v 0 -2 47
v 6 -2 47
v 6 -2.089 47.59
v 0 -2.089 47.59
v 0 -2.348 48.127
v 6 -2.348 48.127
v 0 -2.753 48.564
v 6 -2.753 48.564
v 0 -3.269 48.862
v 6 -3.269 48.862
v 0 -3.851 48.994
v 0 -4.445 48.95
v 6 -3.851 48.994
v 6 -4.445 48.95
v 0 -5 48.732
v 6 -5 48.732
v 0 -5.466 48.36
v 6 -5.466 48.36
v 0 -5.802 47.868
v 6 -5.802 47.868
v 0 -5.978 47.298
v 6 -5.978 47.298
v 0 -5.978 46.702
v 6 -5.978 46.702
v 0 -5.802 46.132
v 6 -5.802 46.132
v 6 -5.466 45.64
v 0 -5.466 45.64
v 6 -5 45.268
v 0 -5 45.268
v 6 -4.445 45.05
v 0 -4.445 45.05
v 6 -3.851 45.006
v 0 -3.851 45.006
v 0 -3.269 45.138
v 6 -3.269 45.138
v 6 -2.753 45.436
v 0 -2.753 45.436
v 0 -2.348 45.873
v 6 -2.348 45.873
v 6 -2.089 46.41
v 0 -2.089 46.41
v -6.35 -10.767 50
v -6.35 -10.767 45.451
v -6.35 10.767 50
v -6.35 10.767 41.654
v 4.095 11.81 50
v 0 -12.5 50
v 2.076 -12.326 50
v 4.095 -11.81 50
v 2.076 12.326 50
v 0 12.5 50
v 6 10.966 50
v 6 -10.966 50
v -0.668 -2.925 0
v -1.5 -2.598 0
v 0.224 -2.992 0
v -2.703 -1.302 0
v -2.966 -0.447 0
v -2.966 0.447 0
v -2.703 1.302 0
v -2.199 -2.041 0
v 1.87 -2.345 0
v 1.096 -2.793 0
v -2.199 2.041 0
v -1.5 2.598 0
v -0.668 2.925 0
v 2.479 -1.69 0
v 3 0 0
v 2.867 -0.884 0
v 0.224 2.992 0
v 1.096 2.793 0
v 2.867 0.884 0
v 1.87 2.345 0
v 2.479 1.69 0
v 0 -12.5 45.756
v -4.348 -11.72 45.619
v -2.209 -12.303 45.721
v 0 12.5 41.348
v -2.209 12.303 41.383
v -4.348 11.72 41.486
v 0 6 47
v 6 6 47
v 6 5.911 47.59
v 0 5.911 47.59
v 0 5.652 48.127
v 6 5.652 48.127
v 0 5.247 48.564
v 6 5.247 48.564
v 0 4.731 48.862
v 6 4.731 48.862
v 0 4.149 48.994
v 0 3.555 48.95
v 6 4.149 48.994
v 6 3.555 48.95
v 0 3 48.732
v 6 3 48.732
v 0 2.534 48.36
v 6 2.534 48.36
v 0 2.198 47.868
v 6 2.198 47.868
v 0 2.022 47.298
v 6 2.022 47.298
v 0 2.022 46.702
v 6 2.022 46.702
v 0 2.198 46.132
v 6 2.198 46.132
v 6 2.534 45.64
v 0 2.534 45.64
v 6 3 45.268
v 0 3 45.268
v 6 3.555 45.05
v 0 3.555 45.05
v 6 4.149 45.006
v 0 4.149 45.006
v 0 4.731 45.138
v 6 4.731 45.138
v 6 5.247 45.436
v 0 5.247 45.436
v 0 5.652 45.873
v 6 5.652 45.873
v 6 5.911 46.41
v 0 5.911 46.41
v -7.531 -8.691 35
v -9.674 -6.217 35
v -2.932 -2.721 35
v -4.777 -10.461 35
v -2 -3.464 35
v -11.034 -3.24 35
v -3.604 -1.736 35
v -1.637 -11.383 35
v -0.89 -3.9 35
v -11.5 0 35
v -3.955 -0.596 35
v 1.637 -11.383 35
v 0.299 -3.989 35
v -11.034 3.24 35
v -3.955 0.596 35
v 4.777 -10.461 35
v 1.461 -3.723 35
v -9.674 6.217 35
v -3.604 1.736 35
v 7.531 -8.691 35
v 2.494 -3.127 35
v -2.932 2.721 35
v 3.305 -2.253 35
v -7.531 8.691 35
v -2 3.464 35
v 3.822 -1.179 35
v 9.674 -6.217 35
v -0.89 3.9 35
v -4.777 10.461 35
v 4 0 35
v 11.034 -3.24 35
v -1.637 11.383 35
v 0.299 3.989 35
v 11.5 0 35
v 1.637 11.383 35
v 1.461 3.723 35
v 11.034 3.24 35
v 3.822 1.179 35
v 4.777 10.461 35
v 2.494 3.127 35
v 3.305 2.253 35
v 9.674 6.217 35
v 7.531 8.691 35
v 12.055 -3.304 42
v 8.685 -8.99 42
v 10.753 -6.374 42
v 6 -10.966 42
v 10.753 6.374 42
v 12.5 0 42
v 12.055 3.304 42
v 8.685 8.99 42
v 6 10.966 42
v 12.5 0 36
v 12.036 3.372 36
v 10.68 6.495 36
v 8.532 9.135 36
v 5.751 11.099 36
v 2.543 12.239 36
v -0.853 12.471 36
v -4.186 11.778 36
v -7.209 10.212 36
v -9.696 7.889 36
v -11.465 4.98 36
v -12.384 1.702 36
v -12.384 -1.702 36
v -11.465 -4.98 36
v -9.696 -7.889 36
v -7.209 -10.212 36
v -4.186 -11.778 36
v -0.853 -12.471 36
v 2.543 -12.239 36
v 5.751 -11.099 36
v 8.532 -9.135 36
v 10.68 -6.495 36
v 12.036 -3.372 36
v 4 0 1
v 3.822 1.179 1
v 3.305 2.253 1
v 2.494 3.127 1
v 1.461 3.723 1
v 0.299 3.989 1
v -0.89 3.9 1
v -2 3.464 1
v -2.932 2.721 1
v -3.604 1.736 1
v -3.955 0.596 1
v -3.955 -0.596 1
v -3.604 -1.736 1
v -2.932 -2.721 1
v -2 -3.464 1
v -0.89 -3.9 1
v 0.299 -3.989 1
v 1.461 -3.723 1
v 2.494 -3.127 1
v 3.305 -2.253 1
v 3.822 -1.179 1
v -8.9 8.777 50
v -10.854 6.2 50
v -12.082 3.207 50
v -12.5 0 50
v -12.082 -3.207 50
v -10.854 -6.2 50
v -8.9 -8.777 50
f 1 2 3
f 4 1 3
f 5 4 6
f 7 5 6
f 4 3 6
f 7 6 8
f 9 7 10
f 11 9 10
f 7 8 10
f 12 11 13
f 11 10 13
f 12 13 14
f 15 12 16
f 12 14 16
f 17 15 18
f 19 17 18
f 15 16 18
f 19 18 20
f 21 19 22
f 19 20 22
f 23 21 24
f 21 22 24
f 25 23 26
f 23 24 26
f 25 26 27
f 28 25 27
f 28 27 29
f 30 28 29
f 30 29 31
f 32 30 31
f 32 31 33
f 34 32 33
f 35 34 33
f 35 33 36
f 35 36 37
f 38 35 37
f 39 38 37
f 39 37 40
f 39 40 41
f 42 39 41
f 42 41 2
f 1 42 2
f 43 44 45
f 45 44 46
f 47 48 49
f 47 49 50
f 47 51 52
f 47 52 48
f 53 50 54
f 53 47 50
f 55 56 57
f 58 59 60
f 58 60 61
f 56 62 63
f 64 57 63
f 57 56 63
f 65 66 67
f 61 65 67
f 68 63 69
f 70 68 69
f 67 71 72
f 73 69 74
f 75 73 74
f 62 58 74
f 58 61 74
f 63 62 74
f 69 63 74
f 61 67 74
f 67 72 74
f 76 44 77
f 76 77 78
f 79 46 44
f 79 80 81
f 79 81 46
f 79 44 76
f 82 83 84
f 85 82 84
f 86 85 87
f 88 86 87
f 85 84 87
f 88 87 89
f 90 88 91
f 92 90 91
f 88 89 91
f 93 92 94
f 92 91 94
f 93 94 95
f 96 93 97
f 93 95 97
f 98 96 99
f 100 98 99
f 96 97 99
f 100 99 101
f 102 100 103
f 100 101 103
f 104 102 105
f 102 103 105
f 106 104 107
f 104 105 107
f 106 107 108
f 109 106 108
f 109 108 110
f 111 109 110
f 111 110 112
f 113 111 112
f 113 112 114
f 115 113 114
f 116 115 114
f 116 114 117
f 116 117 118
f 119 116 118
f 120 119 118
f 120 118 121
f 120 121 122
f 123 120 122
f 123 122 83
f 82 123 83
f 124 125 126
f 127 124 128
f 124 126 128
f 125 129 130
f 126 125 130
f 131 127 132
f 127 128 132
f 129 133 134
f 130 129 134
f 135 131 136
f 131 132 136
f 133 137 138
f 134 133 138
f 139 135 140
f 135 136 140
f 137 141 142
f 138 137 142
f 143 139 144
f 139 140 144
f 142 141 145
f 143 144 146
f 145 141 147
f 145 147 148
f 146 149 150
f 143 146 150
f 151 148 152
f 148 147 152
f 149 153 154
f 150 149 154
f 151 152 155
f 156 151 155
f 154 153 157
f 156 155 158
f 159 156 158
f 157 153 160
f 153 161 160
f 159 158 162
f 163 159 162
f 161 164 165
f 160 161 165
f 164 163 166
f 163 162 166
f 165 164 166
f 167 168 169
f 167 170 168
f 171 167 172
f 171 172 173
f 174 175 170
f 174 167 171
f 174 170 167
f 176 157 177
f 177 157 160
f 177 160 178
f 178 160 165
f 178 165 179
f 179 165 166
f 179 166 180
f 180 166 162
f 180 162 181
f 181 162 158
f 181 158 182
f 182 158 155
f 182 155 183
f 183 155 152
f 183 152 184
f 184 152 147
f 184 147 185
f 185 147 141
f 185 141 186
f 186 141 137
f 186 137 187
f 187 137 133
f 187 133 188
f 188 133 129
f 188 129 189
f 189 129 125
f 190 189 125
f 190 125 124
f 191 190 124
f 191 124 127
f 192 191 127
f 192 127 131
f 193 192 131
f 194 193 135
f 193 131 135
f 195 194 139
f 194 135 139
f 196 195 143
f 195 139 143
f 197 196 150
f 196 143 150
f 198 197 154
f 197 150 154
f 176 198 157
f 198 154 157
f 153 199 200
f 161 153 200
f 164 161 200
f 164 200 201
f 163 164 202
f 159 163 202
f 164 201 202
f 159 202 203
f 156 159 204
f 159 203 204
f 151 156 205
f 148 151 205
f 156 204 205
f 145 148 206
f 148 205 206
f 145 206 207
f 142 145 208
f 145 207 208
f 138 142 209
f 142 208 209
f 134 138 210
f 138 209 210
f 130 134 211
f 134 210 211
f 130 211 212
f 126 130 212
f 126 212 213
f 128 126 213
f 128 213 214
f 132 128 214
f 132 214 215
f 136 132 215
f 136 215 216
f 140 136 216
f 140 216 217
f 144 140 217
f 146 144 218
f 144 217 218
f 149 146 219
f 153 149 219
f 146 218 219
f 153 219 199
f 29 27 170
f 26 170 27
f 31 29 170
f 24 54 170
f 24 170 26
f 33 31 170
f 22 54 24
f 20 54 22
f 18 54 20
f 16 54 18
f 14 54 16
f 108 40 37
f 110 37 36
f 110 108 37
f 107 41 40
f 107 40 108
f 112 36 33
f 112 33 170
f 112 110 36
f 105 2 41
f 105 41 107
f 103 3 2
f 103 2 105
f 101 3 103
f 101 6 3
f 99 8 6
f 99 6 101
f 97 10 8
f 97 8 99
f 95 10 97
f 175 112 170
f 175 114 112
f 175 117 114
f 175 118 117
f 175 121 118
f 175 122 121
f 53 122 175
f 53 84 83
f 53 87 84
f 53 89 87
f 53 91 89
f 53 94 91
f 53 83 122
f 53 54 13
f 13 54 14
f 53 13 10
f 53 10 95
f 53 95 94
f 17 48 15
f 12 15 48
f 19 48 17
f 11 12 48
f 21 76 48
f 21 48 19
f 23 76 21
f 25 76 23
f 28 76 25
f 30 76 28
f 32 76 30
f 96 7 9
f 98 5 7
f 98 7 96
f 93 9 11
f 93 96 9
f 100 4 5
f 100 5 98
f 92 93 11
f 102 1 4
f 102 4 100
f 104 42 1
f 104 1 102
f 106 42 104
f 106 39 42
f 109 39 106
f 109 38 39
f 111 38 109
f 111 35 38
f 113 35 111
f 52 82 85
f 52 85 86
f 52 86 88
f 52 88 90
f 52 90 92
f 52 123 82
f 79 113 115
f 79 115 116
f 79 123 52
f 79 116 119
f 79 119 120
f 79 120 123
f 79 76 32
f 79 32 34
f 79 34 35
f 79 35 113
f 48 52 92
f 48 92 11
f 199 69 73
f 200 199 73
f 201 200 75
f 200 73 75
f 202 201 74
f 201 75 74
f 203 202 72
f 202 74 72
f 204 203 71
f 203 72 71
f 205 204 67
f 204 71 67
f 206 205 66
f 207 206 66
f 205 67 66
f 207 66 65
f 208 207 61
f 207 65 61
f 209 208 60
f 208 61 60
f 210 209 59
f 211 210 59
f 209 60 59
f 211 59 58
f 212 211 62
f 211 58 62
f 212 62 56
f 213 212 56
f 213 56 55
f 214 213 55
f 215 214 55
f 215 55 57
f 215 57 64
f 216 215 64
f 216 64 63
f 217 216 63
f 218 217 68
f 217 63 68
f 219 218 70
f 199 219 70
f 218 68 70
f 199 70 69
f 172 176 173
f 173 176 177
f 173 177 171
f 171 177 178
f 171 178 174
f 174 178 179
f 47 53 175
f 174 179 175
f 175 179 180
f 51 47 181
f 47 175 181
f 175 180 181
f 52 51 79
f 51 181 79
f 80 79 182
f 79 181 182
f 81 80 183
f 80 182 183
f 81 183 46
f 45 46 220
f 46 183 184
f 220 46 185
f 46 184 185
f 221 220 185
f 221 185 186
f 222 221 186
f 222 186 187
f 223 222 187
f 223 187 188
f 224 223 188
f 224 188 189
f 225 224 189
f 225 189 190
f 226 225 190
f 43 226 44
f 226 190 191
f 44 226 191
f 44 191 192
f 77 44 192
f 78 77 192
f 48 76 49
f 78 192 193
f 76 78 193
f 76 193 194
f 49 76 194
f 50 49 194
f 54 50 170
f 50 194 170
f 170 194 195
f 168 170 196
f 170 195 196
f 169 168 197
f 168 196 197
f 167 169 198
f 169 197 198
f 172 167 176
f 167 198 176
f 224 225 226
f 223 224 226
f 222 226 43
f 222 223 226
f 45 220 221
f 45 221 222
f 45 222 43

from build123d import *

# Parameters (mm, degrees)
F0_R      = 4
F1_DEPTH  = 35
F2_R      = 12.5
F2_R_2    = 4
F3_DEPTH  = 15
F4_W      = 6.5
F4_H      = 21.9317121995
F5_DEPTH  = 8
F9_W      = 6.35
F9_H      = 60
F10_DEPTH = 25
F11_R     = 2
F12_DEPTH = 8
F13_SIZE  = 1


with BuildPart() as f1:
    # F0 (on Top) → F1 (new body)
    with BuildSketch(Plane.XY):
        Circle(F0_R)
    extrude(amount=F1_DEPTH)

    # F2 (on face) → F3 (join)
    with BuildSketch(Plane.XY.offset(35)):
        Circle(F2_R)
        Circle(F2_R_2, mode=Mode.SUBTRACT)
        Circle(F2_R)
    extrude(amount=F3_DEPTH)

    # F4 (on face) → F5 (cut)
    with BuildSketch(Plane.XY.offset(50)):
        with Locations((9.25, 0)):
            Rectangle(F4_W, F4_H)
    extrude(amount=-F5_DEPTH, mode=Mode.SUBTRACT)

    # F9 (on offset) → F10 (cut)
    with BuildSketch(Plane(origin=(0, 7.447837655, 42.238786288), x_dir=(1, 0, 0), z_dir=(0, 0.1736481777, 0.984807753))):
        with Locations((-3.175, -7.9551495101)):
            Rectangle(F9_W, F9_H)
    extrude(amount=F10_DEPTH, mode=Mode.SUBTRACT)

    # F11 (on face) → F12 (cut)
    with BuildSketch(Plane.YZ.offset(6)):
        with Locations((4, 47)):
            Circle(F11_R)
        with Locations((-4, 47)):
            Circle(F11_R)
    extrude(amount=-F12_DEPTH, mode=Mode.SUBTRACT)

    # F13
    f13_edges = [f1.edges().sort_by_distance(p)[0] for p in [
        (-12.5, 0, 35),
        (-4, 0, 0),
    ]]
    chamfer(f13_edges, length=F13_SIZE)


solid = f1.part
